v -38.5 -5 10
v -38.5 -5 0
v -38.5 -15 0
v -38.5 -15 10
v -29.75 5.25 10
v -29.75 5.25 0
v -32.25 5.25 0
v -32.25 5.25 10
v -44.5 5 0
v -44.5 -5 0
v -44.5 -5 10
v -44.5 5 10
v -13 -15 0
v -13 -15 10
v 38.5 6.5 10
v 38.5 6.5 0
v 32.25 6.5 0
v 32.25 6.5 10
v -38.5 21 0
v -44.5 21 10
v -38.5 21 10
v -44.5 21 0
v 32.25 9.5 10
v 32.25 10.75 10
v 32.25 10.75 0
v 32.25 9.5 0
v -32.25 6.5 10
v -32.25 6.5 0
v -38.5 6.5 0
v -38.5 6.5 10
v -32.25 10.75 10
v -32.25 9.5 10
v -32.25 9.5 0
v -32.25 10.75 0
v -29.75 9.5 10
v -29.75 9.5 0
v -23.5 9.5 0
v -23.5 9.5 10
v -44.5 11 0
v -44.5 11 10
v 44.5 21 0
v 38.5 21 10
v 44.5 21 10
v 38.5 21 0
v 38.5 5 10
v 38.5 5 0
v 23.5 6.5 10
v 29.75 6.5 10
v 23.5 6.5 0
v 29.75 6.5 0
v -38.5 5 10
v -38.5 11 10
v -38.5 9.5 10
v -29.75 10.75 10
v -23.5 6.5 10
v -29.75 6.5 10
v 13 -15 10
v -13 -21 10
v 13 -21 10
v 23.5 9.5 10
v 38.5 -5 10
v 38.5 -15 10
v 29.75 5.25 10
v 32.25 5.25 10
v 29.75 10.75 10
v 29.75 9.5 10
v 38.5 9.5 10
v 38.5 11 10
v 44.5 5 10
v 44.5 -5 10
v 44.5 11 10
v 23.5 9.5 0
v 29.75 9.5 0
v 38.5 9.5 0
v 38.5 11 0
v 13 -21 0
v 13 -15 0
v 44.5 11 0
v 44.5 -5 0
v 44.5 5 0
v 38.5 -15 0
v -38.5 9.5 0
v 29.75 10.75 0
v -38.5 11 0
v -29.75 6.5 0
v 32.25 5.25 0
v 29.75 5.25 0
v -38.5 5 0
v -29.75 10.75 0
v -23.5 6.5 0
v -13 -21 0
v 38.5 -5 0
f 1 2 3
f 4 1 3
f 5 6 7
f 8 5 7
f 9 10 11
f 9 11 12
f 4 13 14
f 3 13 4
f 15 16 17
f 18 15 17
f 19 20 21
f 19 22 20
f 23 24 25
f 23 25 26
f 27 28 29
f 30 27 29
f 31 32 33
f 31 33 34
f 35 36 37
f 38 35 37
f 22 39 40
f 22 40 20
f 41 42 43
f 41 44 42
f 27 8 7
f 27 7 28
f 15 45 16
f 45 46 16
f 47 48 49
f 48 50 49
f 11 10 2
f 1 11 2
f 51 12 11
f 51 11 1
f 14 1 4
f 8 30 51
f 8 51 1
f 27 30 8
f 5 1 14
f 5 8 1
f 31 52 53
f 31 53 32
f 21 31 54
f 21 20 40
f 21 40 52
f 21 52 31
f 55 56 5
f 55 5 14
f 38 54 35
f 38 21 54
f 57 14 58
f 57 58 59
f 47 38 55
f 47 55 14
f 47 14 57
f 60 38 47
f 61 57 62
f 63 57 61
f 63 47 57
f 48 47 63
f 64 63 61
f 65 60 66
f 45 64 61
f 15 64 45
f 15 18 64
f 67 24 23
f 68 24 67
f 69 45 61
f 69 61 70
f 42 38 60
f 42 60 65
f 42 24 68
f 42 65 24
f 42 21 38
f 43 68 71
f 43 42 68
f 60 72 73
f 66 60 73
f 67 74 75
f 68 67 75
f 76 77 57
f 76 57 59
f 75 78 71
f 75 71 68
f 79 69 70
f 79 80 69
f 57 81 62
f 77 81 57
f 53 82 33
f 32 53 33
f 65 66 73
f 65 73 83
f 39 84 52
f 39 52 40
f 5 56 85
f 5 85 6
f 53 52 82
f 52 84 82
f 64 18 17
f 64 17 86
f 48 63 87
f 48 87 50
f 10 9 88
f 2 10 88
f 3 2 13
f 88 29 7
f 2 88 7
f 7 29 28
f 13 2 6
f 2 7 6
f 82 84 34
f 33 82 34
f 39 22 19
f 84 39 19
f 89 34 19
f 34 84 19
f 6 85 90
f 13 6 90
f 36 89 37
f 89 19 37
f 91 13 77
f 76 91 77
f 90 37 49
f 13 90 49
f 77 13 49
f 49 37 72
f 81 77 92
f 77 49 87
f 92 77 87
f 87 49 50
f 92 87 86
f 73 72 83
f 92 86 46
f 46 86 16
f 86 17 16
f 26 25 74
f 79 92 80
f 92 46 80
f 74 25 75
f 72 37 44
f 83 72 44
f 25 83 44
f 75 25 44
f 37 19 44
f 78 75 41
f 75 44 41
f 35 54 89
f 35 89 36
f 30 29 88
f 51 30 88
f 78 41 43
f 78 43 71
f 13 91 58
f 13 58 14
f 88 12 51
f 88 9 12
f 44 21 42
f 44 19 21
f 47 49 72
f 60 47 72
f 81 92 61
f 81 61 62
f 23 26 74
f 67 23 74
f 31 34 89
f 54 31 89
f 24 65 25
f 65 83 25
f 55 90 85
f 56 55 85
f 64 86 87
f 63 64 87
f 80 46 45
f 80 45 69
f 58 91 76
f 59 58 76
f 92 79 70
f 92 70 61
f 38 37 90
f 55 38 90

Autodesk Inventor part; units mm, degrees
ref_plane "YZ Plane" through (0, 0, 0) normal (1, 0, 0) x (0, 1, 0)
ref_plane "XZ Plane" through (0, 0, 0) normal (0, 1, 0) x (-1, 0, 0)
ref_plane "XY Plane" through (0, 0, 0) normal (0, 0, 1) x (1, 0, 0)
sketch "0" plane through (0, 0, 0) normal (0, 0, 1) x (1, 0, 0)
  line L0 (-44.5, -5) -> (-44.5, 5)
  line L1 (-44.5, 5) -> (-38.5, 5)
  line L2 (-38.5, 11) -> (-38.5, 9.5)
  line L3 (-38.5, 9.5) -> (-32.25, 9.5)
  line L4 (-23.5, 9.5) -> (-23.5, 6.5)
  line L5 (-23.5, 6.5) -> (-29.75, 6.5)
  line L6 (-32.25, 5.25) -> (-32.25, 6.5)
  line L7 (-32.25, 10.75) -> (-29.75, 10.75)
  line L8 (-29.75, 10.75) -> (-29.75, 9.5)
  line L9 (-29.75, 5.25) -> (-32.25, 5.25)
  line L10 (-32.25, 6.5) -> (-38.5, 6.5)
  line L11 (-29.75, 6.5) -> (-29.75, 5.25)
  line L12 (-32.25, 9.5) -> (-32.25, 10.75)
  line L13 (-38.5, 6.5) -> (-38.5, 5)
  line L14 (-44.5, 11) -> (-44.5, 21)
  line L15 (-38.5, 11) -> (-44.5, 11)
  line L16 (-44.5, 21) -> (-38.5, 21)
  line L17 (-29.75, 9.5) -> (-23.5, 9.5)
  line L18 (38.5, 21) -> (44.5, 21)
  line L19 (44.5, 21) -> (44.5, 11)
  line L20 (44.5, 11) -> (38.5, 11)
  line L21 (38.5, 5) -> (38.5, 6.5)
  line L22 (38.5, 6.5) -> (32.25, 6.5)
  line L23 (23.5, 6.5) -> (23.5, 9.5)
  line L24 (23.5, 9.5) -> (29.75, 9.5)
  line L25 (32.25, 10.75) -> (32.25, 9.5)
  line L26 (32.25, 5.25) -> (29.75, 5.25)
  line L27 (29.75, 5.25) -> (29.75, 6.5)
  line L28 (29.75, 10.75) -> (32.25, 10.75)
  line L29 (32.25, 9.5) -> (38.5, 9.5)
  line L30 (29.75, 9.5) -> (29.75, 10.75)
  line L31 (32.25, 6.5) -> (32.25, 5.25)
  line L32 (38.5, 9.5) -> (38.5, 11)
  line L33 (44.5, 5) -> (44.5, -5)
  line L34 (38.5, 5) -> (44.5, 5)
  line L35 (29.75, 6.5) -> (23.5, 6.5)
  line L36 (-38.5, 21) -> (38.5, 21)
  line L37 (38.5, -15) -> (13, -15)
  line L38 (13, -15) -> (13, -21)
  line L39 (-13, -21) -> (-13, -15)
  line L40 (-13, -15) -> (-38.5, -15)
  line L41 (-13, -21) -> (13, -21)
  line L42 (-44.5, -5) -> (-38.5, -5)
  line L43 (-38.5, -5) -> (-38.5, -15)
  line L44 (44.5, -5) -> (38.5, -5)
  line L45 (38.5, -5) -> (38.5, -15)
sketch "Эскиз3" plane through (0, 0, 0) normal (0, 0, 1) x (1, 0, 0)
  line L0 (-44.5, 21) -> (-38.5, 21) projected
  line L1 (-38.5, 21) -> (38.5, 21) projected
  line L2 (38.5, 21) -> (44.5, 21) projected
  line L3 (44.5, 21) -> (44.5, 11) projected
  line L4 (44.5, 11) -> (38.5, 11) projected
  line L5 (38.5, 5) -> (44.5, 5) projected
  line L6 (38.5, 5) -> (38.5, 6.5) projected
  line L7 (38.5, 9.5) -> (38.5, 11) projected
  line L8 (32.25, 9.5) -> (38.5, 9.5) projected
  line L9 (38.5, 6.5) -> (32.25, 6.5) projected
  line L10 (32.25, 6.5) -> (32.25, 5.25) projected
  line L11 (32.25, 5.25) -> (29.75, 5.25) projected
  line L12 (29.75, 5.25) -> (29.75, 6.5) projected
  line L13 (29.75, 10.75) -> (32.25, 10.75) projected
  line L14 (32.25, 10.75) -> (32.25, 9.5) projected
  line L15 (29.75, 9.5) -> (29.75, 10.75) projected
  line L16 (29.75, 6.5) -> (23.5, 6.5) projected
  line L17 (23.5, 9.5) -> (29.75, 9.5) projected
  line L18 (23.5, 6.5) -> (23.5, 9.5) projected
  line L19 (44.5, 5) -> (44.5, -5) projected
  line L20 (44.5, -5) -> (38.5, -5) projected
  line L21 (38.5, -5) -> (38.5, -15) projected
  line L22 (13, -15) -> (13, -21) projected
  line L23 (38.5, -15) -> (13, -15) projected
  line L24 (-13, -21) -> (13, -21) projected
  line L25 (-13, -21) -> (-13, -15) projected
  line L26 (-13, -15) -> (-38.5, -15) projected
  line L27 (-38.5, -5) -> (-38.5, -15) projected
  line L28 (-44.5, -5) -> (-38.5, -5) projected
  line L29 (-44.5, -5) -> (-44.5, 5) projected
  line L30 (-44.5, 5) -> (-38.5, 5) projected
  line L31 (-38.5, 6.5) -> (-38.5, 5) projected
  line L32 (-32.25, 6.5) -> (-38.5, 6.5) projected
  line L33 (-32.25, 5.25) -> (-32.25, 6.5) projected
  line L34 (-29.75, 5.25) -> (-32.25, 5.25) projected
  line L35 (-29.75, 6.5) -> (-29.75, 5.25) projected
  line L36 (-23.5, 6.5) -> (-29.75, 6.5) projected
  line L37 (-23.5, 9.5) -> (-23.5, 6.5) projected
  line L38 (-29.75, 9.5) -> (-23.5, 9.5) projected
  line L39 (-29.75, 10.75) -> (-29.75, 9.5) projected
  line L40 (-32.25, 10.75) -> (-29.75, 10.75) projected
  line L41 (-32.25, 9.5) -> (-32.25, 10.75) projected
  line L42 (-38.5, 9.5) -> (-32.25, 9.5) projected
  line L43 (-38.5, 11) -> (-38.5, 9.5) projected
  line L44 (-38.5, 11) -> (-44.5, 11) projected
  line L45 (-44.5, 11) -> (-44.5, 21) projected
  line L46 (-44.5, 21) -> (44.5, 21)
  line L47 (44.5, 21) -> (44.5, 11)
  line L48 (-44.5, 11) -> (-44.5, 21)
  line L49 (23.5, 6.5) -> (23.5, 9.5)
  line L50 (29.75, 10.75) -> (32.25, 10.75)
  line L51 (32.25, 5.25) -> (29.75, 5.25)
  line L52 (44.5, 5) -> (38.5, 5)
  line L53 (44.5, 5) -> (38.5, 5)
  line L54 (38.5, -5) -> (44.5, -5)
  line L55 (44.5, -5) -> (44.5, 5)
  line L56 (13, -15) -> (38.5, -15)
  line L57 (38.5, -15) -> (38.5, -5)
  line L58 (13, -21) -> (-13, -21)
  line L59 (-13, -21) -> (-13, -15)
  line L60 (13, -15) -> (13, -21)
  line L61 (-13, -15) -> (-38.5, -15)
  line L62 (-38.5, -15) -> (-38.5, -5)
  line L63 (-44.5, 5) -> (-38.5, 5)
  line L64 (-38.5, -5) -> (-44.5, -5)
  line L65 (-44.5, -5) -> (-44.5, 5)
  line L66 (-44.5, 5) -> (-38.5, 5)
  line L67 (-23.5, 9.5) -> (-23.5, 6.5)
  line L68 (-32.25, 10.75) -> (-29.75, 10.75)
  line L69 (-29.75, 5.25) -> (-32.25, 5.25)
  line L70 (-32.25, 5.25) -> (-32.25, 6.5)
  line L71 (-32.25, 9.5) -> (-32.25, 10.75)
  line L72 (-29.75, 10.75) -> (-29.75, 9.5)
  line L73 (-29.75, 6.5) -> (-29.75, 5.25)
  line L74 (-38.5, 9.5) -> (-32.25, 9.5)
  line L75 (-29.75, 9.5) -> (-23.5, 9.5)
  line L76 (-23.5, 6.5) -> (-29.75, 6.5)
  line L77 (-32.25, 6.5) -> (-38.5, 6.5)
  line L78 (29.75, 5.25) -> (29.75, 6.5)
  line L79 (29.75, 9.5) -> (29.75, 10.75)
  line L80 (32.25, 10.75) -> (32.25, 9.5)
  line L81 (32.25, 6.5) -> (32.25, 5.25)
  line L82 (23.5, 9.5) -> (29.75, 9.5)
  line L83 (32.25, 9.5) -> (38.5, 9.5)
  line L84 (38.5, 6.5) -> (32.25, 6.5)
  line L85 (29.75, 6.5) -> (23.5, 6.5)
  line L86 (38.5, 5) -> (38.5, 6.5)
  line L87 (38.5, 9.5) -> (38.5, 11)
  line L88 (-38.5, 5) -> (-38.5, 6.5)
  line L89 (-38.5, 9.5) -> (-38.5, 11)
  line L90 (44.5, 11) -> (38.5, 11)
  line L91 (-38.5, 11) -> (-44.5, 11)
  line L92 (-44.5, 11) -> (-44.5, 10.75)
  line L93 (-44.5, 5.25) -> (-44.5, 5)
  line L94 (44.5, 11) -> (44.5, 10.75)
  line L95 (44.5, 5.25) -> (44.5, 5)
  point P0 (0, 0)
extrude "Выдавливание2" add sketch "0" along normal blind 10
properties part number "Крепление_мотора3_платформа"
